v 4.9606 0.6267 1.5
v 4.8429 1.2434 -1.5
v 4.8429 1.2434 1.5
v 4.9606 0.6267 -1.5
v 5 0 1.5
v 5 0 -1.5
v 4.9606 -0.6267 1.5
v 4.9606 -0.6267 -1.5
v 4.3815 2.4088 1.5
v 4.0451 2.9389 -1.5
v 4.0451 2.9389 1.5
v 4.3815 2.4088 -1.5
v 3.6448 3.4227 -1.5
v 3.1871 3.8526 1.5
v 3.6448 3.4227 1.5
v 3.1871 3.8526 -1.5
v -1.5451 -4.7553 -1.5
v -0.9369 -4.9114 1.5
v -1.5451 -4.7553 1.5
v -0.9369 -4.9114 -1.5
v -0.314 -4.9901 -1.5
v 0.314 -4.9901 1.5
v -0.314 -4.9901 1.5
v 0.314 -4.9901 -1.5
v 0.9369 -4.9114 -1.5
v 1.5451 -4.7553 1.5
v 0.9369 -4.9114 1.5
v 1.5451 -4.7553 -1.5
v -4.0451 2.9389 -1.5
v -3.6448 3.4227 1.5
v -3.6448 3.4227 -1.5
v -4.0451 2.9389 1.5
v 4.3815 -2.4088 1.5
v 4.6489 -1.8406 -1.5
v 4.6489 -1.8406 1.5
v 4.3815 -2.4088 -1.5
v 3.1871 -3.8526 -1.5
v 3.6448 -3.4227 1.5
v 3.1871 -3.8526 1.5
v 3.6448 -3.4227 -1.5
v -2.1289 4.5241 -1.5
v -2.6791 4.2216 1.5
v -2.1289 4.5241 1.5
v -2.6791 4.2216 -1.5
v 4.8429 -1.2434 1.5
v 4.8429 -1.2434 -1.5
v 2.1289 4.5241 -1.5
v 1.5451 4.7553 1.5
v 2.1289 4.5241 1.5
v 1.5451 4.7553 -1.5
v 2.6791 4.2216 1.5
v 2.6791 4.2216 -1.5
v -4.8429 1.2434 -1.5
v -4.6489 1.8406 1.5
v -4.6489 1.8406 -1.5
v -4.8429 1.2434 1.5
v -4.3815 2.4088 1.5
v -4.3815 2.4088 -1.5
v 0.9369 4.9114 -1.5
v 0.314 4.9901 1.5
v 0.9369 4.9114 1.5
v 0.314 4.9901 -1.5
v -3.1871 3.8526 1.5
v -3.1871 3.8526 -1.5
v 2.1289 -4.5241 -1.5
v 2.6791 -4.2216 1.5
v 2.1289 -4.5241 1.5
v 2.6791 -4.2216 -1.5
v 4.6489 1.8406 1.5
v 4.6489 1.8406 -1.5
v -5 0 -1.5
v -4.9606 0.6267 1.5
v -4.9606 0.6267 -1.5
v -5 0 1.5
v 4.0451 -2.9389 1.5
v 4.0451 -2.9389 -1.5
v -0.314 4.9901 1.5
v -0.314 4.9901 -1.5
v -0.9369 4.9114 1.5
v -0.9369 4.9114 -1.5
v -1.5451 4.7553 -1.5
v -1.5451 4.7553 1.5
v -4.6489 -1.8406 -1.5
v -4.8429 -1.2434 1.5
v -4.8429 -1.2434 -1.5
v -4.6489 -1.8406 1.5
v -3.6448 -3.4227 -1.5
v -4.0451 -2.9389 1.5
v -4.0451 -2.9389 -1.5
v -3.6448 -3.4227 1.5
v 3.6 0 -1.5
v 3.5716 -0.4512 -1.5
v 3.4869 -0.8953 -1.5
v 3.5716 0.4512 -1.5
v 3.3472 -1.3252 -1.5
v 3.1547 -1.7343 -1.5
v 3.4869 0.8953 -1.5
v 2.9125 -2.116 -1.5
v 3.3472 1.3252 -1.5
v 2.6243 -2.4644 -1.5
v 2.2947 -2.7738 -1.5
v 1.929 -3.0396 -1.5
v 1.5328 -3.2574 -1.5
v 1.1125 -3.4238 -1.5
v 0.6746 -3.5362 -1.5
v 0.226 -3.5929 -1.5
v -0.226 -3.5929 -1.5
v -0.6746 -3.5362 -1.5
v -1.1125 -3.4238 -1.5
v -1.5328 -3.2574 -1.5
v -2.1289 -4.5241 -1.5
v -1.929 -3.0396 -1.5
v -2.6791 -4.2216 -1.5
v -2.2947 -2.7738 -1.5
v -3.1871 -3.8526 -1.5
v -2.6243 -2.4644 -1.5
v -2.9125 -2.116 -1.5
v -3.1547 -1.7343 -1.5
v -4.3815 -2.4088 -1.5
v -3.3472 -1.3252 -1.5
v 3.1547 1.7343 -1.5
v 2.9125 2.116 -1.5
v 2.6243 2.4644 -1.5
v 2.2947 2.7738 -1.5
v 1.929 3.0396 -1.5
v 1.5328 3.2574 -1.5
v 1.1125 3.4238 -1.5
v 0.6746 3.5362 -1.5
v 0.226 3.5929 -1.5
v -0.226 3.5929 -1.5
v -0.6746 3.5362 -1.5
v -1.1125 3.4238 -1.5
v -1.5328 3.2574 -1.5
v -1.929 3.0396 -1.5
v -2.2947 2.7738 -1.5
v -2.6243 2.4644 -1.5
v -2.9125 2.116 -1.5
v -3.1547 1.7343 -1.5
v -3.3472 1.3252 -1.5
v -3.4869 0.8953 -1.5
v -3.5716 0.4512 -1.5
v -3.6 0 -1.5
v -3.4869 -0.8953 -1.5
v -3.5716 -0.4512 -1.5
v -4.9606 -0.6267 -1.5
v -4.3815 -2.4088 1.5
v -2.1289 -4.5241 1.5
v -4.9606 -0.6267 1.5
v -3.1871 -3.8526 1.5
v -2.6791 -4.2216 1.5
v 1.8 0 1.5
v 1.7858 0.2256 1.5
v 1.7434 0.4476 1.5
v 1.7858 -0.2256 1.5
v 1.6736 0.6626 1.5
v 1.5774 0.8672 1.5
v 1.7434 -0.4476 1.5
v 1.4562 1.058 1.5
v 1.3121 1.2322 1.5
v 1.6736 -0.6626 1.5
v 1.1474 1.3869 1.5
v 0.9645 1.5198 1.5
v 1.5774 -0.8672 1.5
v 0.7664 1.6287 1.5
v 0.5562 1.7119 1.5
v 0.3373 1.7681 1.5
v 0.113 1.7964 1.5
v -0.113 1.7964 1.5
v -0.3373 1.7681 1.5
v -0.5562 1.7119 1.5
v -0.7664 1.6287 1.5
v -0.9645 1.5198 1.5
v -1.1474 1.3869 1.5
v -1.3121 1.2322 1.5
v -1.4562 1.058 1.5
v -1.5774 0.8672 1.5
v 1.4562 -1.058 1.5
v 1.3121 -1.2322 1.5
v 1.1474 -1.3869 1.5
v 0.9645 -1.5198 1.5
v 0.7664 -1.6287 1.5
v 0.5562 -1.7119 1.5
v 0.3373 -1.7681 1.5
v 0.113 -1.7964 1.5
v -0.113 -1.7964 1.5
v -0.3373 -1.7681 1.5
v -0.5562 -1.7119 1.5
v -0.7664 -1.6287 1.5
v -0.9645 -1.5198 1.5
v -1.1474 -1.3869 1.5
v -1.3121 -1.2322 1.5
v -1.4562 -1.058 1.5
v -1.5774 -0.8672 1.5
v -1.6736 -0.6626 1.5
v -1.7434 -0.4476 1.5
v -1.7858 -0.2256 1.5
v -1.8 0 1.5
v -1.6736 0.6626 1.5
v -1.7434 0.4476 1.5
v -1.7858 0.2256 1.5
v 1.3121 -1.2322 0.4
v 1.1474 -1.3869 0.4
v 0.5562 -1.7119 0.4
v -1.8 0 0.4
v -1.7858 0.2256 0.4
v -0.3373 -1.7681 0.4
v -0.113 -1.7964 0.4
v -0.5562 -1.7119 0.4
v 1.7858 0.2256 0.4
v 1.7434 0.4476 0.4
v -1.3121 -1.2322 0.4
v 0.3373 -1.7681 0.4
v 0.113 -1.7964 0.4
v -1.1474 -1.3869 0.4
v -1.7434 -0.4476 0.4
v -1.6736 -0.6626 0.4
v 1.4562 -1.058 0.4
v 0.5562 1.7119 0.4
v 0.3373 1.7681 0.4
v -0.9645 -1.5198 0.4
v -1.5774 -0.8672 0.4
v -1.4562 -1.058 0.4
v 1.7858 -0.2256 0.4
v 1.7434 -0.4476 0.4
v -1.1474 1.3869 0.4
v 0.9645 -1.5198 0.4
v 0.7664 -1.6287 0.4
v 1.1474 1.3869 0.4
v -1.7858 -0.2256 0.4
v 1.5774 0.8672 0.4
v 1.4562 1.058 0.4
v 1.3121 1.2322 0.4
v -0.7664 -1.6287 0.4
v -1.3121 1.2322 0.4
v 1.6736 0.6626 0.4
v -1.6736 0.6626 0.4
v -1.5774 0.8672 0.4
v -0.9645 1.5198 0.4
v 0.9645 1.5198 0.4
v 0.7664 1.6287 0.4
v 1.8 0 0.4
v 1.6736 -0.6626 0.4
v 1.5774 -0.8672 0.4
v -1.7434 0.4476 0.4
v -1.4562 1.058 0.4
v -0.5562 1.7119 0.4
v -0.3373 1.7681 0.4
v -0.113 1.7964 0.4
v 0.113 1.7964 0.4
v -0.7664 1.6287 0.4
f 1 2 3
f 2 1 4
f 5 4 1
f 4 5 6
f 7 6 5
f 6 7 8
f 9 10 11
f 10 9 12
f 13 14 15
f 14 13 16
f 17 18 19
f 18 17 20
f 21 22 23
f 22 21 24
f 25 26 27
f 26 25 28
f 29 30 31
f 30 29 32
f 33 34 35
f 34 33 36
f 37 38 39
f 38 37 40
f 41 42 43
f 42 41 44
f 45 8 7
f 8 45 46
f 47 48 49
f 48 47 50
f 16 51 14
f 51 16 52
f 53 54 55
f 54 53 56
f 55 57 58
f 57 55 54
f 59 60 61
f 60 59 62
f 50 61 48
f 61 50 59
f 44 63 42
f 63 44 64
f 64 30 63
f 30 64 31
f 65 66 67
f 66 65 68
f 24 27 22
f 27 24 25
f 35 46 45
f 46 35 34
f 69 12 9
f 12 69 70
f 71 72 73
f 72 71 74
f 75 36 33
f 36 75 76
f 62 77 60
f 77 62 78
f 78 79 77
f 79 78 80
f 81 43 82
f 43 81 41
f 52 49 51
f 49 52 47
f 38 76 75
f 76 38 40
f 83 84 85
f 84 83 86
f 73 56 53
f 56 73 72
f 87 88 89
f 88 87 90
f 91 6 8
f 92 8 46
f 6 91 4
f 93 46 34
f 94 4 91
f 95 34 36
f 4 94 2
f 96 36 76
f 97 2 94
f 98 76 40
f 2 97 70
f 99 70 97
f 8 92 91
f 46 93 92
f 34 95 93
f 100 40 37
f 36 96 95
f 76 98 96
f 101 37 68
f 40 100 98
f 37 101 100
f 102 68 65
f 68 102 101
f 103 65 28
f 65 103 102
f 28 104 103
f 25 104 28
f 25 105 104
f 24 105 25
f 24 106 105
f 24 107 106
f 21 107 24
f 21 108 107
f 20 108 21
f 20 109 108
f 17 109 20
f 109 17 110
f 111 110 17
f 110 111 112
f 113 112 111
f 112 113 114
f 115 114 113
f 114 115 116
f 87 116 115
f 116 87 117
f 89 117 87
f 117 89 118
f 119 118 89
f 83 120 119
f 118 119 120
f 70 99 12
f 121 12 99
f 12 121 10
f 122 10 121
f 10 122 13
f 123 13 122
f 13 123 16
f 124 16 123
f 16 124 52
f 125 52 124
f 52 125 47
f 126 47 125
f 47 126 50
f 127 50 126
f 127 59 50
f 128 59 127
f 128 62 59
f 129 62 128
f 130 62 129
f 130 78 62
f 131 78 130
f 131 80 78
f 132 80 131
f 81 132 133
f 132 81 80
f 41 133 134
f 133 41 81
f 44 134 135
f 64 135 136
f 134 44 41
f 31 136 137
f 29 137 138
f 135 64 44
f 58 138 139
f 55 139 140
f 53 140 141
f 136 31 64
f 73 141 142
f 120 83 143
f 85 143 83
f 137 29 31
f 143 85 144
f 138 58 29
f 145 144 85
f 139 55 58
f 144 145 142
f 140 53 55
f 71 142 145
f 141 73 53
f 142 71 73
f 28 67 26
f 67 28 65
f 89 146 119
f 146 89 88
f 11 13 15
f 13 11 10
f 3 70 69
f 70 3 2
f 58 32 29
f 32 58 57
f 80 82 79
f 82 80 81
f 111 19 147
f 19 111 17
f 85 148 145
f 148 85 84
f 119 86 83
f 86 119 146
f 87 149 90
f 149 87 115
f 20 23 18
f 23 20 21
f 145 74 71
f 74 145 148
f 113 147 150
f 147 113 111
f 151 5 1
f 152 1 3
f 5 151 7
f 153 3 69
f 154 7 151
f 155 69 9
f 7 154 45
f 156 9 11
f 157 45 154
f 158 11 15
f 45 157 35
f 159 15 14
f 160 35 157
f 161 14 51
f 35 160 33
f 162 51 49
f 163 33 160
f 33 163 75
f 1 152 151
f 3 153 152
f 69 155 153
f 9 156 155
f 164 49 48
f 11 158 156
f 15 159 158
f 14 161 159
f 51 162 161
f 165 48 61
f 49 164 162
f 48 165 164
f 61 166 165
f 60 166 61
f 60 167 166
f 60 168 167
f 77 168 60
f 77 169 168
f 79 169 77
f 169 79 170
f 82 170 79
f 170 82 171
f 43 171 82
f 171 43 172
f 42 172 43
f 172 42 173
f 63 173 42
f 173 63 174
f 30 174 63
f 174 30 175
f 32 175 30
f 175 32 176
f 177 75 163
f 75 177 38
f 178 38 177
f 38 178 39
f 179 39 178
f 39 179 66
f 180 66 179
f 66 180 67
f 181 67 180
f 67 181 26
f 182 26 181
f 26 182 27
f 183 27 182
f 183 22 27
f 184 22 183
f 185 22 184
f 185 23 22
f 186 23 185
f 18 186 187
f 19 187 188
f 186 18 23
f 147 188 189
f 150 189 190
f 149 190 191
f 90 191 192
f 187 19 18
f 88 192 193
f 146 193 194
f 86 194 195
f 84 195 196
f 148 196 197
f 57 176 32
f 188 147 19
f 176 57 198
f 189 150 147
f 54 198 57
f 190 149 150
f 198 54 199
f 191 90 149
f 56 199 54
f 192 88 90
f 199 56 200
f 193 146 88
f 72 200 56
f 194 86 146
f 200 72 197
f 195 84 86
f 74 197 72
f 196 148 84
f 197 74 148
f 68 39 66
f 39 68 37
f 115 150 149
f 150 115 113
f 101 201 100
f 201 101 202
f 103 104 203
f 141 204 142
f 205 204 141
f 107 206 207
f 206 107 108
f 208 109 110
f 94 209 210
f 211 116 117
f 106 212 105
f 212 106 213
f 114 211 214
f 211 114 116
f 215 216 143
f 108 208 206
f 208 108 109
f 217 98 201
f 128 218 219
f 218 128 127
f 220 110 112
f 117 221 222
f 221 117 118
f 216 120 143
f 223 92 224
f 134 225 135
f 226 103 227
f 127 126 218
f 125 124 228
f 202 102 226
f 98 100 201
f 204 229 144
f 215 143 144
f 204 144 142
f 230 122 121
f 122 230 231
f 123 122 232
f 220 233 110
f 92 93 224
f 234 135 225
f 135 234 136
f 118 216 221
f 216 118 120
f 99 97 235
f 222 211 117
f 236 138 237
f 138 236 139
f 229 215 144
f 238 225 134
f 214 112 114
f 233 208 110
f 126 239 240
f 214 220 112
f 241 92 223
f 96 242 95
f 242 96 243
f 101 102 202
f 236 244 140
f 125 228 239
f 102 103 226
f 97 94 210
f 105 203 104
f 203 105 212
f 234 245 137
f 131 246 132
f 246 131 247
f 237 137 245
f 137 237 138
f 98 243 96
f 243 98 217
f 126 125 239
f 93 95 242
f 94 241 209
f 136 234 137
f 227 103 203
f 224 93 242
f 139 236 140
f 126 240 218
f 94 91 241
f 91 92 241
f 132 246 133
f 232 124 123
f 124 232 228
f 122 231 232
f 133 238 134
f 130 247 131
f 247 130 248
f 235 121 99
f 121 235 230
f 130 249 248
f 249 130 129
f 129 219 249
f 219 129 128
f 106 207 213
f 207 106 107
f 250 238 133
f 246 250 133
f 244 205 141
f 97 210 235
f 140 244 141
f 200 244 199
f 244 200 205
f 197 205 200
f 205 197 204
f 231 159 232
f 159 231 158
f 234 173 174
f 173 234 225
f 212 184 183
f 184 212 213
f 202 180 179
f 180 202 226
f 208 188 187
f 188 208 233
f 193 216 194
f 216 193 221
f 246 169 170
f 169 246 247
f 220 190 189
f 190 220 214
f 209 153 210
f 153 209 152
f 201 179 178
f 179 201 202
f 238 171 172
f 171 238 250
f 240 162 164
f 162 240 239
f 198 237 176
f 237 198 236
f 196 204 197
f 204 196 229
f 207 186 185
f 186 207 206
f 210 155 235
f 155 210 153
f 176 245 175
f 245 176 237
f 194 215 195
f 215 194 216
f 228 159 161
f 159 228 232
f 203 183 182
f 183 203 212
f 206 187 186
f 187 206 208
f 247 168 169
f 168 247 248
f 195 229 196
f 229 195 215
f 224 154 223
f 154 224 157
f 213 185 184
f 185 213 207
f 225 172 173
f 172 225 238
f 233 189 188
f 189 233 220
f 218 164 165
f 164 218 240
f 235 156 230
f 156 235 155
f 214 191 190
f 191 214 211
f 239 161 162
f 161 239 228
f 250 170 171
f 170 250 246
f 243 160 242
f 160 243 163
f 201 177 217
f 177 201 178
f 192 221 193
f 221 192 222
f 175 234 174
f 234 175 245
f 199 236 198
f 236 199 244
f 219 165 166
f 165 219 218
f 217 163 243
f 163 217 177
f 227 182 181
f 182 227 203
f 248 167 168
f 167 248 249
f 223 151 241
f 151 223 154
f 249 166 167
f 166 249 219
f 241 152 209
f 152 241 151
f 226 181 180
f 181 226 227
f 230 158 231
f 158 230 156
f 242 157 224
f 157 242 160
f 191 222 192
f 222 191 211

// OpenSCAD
$fn = 50;


difference() {
	union() {
		translate(v = [0, 0, -1.5000000000]) {
			cylinder(h = 3, r = 5.0000000000);
		}
		translate(v = [0, 0, -1.5000000000]) {
			cylinder(h = 3, r = 2.8500000000);
		}
	}
	union() {
		translate(v = [0, 0, -1.5000000000]) {
			rotate(a = [0, 180, 0]) {
				difference() {
					union() {
						translate(v = [0, 0, -3.0000000000]) {
							cylinder(h = 3, r = 1.5000000000);
						}
						translate(v = [0, 0, -1.9000000000]) {
							cylinder(h = 1.9000000000, r1 = 1.8000000000, r2 = 3.6000000000);
						}
						translate(v = [0, 0, -3.0000000000]) {
							cylinder(h = 3, r = 1.8000000000);
						}
						translate(v = [0, 0, -3.0000000000]) {
							cylinder(h = 3, r = 1.5000000000);
						}
					}
					union();
				}
			}
		}
		translate(v = [0, 0, -50.0000000000]) {
			cylinder(h = 100, r = 1.8000000000);
		}
	}
}
